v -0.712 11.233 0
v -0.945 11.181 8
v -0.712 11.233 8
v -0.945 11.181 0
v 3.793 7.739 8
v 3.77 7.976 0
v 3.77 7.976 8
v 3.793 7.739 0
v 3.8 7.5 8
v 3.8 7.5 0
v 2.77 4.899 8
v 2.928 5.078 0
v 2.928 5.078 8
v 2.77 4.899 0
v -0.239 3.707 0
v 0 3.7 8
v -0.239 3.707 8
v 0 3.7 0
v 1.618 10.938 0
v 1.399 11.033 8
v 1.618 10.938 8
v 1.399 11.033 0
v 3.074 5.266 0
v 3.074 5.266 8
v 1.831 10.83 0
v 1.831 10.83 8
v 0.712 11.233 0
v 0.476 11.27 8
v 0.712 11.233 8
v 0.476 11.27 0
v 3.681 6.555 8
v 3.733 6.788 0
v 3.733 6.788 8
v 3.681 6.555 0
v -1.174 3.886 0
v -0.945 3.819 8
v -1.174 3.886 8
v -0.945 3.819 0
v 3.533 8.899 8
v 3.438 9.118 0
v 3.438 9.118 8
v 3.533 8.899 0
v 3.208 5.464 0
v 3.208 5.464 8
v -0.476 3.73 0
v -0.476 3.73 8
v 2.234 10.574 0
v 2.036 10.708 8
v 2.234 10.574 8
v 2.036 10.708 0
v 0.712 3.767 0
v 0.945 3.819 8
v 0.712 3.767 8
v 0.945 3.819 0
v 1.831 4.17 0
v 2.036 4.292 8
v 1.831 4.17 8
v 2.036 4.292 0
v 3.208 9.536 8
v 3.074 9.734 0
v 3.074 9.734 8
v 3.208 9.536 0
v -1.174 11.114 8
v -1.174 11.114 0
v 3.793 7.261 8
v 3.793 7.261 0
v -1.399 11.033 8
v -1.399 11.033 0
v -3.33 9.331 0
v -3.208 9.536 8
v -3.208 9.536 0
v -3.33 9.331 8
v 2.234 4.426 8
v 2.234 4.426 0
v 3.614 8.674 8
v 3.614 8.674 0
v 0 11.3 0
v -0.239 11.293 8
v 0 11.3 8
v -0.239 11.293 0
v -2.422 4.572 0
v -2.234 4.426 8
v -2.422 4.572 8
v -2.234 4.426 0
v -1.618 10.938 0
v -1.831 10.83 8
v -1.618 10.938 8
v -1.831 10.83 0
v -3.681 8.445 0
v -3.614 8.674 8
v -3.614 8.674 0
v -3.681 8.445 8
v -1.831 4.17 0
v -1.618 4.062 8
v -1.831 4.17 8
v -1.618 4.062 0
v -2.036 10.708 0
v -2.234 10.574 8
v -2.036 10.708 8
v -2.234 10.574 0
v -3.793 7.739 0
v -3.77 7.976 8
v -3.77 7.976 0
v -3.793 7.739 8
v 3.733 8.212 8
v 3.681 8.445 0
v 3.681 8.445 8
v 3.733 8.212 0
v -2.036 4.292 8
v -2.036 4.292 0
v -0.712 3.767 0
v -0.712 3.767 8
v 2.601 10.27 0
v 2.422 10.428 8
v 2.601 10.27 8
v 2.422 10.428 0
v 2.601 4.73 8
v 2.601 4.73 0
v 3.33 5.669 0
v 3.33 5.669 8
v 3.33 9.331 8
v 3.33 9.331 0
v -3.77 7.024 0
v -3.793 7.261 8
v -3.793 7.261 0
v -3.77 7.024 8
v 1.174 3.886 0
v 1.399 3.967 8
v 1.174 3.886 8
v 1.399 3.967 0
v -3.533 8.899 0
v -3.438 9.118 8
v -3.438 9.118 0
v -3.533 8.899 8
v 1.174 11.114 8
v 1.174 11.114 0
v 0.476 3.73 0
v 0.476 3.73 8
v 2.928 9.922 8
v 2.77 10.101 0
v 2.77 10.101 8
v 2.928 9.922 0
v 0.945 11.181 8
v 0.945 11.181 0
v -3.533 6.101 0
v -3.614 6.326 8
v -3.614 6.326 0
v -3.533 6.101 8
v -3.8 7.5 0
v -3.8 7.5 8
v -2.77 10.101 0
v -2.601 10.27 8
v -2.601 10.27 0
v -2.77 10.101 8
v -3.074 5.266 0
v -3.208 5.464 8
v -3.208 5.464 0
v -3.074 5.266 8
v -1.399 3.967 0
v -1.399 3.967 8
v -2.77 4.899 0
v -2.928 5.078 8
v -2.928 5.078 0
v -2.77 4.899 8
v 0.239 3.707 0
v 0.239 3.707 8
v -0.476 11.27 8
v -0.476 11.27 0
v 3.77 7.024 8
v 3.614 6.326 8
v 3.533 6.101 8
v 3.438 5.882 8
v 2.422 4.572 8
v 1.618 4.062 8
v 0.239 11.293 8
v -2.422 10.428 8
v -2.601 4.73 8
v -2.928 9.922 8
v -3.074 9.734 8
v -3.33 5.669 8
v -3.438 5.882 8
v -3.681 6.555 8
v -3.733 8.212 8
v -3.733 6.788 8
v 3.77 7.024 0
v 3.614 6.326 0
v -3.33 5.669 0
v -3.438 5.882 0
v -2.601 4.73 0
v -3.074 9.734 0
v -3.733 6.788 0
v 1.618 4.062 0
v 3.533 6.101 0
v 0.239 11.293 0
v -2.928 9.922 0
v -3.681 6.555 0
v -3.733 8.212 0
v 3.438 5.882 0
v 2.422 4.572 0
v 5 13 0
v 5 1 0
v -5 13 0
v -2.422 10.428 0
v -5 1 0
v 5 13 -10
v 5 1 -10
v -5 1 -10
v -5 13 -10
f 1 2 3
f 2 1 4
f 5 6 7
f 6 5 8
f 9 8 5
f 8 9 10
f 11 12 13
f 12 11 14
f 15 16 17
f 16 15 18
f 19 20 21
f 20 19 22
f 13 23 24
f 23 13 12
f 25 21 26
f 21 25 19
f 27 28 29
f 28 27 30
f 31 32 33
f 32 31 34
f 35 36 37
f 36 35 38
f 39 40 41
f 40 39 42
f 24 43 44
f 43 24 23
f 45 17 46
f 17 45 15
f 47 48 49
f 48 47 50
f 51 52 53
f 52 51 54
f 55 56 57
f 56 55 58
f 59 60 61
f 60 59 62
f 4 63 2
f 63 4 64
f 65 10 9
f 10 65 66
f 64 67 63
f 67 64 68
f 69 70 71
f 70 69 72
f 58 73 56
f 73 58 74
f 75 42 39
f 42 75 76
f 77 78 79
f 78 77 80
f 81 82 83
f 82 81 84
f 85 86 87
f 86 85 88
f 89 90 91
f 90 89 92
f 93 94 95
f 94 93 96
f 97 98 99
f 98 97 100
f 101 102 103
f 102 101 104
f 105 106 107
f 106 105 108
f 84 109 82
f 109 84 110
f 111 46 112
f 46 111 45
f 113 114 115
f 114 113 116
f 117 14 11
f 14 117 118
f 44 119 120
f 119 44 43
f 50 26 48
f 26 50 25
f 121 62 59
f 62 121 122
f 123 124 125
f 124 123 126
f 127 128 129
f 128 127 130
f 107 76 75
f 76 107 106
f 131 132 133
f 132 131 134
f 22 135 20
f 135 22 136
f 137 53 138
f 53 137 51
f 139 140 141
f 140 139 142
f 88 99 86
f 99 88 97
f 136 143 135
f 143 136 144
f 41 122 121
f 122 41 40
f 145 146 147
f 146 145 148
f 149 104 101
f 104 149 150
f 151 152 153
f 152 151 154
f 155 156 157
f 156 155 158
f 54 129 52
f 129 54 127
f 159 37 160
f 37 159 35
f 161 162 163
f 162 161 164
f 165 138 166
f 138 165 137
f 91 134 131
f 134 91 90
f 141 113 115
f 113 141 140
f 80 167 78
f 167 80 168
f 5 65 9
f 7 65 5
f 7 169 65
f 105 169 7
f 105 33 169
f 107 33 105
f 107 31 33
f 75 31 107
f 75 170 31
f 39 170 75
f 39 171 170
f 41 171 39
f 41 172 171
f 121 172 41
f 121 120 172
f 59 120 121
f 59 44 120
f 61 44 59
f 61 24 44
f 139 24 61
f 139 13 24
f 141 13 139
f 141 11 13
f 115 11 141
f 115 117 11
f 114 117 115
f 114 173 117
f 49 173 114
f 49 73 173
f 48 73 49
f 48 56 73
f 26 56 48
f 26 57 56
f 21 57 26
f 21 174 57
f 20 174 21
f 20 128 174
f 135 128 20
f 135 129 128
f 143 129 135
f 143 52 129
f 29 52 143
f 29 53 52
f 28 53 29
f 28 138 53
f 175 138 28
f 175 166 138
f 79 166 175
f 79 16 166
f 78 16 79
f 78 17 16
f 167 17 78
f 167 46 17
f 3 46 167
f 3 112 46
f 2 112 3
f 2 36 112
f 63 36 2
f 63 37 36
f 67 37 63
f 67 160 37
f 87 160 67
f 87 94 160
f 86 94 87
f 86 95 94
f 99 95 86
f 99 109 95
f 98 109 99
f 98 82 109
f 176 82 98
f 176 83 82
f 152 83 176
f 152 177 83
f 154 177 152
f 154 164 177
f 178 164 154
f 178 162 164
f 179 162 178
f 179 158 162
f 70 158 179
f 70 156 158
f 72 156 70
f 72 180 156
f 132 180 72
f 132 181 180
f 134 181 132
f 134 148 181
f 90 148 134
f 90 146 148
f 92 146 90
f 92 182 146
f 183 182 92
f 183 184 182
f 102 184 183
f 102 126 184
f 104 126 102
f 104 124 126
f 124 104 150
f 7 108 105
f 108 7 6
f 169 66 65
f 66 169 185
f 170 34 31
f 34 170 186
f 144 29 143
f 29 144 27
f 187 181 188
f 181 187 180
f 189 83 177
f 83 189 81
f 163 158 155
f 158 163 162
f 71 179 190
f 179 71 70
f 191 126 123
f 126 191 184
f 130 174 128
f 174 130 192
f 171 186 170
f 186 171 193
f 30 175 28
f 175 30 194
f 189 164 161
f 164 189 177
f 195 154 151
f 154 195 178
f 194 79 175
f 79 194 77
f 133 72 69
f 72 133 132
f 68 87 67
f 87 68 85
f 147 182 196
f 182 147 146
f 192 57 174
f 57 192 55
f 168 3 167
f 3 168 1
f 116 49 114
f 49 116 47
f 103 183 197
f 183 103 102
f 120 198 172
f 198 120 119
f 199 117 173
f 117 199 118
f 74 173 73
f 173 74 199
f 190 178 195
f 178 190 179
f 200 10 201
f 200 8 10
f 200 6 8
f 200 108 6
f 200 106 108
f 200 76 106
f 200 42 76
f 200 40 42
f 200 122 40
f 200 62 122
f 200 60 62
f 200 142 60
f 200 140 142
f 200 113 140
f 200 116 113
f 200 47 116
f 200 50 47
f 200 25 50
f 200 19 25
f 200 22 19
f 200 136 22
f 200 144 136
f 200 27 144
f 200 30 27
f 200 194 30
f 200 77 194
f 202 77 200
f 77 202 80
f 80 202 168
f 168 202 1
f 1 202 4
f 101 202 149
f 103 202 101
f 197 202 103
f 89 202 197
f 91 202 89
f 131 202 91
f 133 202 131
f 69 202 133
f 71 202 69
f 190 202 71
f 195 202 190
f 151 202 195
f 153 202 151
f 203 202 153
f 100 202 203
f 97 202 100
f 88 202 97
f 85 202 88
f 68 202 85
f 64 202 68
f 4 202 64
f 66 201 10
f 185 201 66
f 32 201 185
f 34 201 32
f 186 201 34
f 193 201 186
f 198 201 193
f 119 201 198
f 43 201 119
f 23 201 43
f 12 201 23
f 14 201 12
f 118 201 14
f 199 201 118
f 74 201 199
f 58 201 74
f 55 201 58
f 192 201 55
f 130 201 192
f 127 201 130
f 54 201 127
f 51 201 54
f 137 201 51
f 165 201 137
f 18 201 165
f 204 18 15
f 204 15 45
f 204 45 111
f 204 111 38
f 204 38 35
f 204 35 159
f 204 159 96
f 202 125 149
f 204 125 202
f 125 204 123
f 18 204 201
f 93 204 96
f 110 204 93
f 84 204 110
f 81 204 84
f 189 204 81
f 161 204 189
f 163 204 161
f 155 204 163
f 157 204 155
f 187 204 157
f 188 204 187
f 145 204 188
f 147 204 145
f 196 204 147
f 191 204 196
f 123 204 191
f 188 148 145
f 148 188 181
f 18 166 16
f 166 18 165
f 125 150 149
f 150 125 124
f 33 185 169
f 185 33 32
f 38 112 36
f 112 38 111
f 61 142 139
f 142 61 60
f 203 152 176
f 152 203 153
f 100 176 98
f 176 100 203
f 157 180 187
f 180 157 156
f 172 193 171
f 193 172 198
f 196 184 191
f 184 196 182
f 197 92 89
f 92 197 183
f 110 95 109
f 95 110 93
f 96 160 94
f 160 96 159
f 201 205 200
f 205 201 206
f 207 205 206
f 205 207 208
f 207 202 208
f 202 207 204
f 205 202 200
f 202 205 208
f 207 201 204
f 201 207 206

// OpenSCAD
// Based on Alpha RV09
tolerance = 0.3;
$fn = $preview ? 20 : 100;

module pot_rv09() {
    
    translate([0, 7.5, 0]){
        translate([0, 0, 0])
        cylinder(r = 3.5 + tolerance, h = 8);

        //translate([-1, -6.5, 0])
        //cube([2, 3, 1]);
        
        translate([0, 0, -10])
            union() {
                translate([-5, -6.5, 0])
                cube([10, 12, 10]);
            }
    }
}

pot_rv09();
